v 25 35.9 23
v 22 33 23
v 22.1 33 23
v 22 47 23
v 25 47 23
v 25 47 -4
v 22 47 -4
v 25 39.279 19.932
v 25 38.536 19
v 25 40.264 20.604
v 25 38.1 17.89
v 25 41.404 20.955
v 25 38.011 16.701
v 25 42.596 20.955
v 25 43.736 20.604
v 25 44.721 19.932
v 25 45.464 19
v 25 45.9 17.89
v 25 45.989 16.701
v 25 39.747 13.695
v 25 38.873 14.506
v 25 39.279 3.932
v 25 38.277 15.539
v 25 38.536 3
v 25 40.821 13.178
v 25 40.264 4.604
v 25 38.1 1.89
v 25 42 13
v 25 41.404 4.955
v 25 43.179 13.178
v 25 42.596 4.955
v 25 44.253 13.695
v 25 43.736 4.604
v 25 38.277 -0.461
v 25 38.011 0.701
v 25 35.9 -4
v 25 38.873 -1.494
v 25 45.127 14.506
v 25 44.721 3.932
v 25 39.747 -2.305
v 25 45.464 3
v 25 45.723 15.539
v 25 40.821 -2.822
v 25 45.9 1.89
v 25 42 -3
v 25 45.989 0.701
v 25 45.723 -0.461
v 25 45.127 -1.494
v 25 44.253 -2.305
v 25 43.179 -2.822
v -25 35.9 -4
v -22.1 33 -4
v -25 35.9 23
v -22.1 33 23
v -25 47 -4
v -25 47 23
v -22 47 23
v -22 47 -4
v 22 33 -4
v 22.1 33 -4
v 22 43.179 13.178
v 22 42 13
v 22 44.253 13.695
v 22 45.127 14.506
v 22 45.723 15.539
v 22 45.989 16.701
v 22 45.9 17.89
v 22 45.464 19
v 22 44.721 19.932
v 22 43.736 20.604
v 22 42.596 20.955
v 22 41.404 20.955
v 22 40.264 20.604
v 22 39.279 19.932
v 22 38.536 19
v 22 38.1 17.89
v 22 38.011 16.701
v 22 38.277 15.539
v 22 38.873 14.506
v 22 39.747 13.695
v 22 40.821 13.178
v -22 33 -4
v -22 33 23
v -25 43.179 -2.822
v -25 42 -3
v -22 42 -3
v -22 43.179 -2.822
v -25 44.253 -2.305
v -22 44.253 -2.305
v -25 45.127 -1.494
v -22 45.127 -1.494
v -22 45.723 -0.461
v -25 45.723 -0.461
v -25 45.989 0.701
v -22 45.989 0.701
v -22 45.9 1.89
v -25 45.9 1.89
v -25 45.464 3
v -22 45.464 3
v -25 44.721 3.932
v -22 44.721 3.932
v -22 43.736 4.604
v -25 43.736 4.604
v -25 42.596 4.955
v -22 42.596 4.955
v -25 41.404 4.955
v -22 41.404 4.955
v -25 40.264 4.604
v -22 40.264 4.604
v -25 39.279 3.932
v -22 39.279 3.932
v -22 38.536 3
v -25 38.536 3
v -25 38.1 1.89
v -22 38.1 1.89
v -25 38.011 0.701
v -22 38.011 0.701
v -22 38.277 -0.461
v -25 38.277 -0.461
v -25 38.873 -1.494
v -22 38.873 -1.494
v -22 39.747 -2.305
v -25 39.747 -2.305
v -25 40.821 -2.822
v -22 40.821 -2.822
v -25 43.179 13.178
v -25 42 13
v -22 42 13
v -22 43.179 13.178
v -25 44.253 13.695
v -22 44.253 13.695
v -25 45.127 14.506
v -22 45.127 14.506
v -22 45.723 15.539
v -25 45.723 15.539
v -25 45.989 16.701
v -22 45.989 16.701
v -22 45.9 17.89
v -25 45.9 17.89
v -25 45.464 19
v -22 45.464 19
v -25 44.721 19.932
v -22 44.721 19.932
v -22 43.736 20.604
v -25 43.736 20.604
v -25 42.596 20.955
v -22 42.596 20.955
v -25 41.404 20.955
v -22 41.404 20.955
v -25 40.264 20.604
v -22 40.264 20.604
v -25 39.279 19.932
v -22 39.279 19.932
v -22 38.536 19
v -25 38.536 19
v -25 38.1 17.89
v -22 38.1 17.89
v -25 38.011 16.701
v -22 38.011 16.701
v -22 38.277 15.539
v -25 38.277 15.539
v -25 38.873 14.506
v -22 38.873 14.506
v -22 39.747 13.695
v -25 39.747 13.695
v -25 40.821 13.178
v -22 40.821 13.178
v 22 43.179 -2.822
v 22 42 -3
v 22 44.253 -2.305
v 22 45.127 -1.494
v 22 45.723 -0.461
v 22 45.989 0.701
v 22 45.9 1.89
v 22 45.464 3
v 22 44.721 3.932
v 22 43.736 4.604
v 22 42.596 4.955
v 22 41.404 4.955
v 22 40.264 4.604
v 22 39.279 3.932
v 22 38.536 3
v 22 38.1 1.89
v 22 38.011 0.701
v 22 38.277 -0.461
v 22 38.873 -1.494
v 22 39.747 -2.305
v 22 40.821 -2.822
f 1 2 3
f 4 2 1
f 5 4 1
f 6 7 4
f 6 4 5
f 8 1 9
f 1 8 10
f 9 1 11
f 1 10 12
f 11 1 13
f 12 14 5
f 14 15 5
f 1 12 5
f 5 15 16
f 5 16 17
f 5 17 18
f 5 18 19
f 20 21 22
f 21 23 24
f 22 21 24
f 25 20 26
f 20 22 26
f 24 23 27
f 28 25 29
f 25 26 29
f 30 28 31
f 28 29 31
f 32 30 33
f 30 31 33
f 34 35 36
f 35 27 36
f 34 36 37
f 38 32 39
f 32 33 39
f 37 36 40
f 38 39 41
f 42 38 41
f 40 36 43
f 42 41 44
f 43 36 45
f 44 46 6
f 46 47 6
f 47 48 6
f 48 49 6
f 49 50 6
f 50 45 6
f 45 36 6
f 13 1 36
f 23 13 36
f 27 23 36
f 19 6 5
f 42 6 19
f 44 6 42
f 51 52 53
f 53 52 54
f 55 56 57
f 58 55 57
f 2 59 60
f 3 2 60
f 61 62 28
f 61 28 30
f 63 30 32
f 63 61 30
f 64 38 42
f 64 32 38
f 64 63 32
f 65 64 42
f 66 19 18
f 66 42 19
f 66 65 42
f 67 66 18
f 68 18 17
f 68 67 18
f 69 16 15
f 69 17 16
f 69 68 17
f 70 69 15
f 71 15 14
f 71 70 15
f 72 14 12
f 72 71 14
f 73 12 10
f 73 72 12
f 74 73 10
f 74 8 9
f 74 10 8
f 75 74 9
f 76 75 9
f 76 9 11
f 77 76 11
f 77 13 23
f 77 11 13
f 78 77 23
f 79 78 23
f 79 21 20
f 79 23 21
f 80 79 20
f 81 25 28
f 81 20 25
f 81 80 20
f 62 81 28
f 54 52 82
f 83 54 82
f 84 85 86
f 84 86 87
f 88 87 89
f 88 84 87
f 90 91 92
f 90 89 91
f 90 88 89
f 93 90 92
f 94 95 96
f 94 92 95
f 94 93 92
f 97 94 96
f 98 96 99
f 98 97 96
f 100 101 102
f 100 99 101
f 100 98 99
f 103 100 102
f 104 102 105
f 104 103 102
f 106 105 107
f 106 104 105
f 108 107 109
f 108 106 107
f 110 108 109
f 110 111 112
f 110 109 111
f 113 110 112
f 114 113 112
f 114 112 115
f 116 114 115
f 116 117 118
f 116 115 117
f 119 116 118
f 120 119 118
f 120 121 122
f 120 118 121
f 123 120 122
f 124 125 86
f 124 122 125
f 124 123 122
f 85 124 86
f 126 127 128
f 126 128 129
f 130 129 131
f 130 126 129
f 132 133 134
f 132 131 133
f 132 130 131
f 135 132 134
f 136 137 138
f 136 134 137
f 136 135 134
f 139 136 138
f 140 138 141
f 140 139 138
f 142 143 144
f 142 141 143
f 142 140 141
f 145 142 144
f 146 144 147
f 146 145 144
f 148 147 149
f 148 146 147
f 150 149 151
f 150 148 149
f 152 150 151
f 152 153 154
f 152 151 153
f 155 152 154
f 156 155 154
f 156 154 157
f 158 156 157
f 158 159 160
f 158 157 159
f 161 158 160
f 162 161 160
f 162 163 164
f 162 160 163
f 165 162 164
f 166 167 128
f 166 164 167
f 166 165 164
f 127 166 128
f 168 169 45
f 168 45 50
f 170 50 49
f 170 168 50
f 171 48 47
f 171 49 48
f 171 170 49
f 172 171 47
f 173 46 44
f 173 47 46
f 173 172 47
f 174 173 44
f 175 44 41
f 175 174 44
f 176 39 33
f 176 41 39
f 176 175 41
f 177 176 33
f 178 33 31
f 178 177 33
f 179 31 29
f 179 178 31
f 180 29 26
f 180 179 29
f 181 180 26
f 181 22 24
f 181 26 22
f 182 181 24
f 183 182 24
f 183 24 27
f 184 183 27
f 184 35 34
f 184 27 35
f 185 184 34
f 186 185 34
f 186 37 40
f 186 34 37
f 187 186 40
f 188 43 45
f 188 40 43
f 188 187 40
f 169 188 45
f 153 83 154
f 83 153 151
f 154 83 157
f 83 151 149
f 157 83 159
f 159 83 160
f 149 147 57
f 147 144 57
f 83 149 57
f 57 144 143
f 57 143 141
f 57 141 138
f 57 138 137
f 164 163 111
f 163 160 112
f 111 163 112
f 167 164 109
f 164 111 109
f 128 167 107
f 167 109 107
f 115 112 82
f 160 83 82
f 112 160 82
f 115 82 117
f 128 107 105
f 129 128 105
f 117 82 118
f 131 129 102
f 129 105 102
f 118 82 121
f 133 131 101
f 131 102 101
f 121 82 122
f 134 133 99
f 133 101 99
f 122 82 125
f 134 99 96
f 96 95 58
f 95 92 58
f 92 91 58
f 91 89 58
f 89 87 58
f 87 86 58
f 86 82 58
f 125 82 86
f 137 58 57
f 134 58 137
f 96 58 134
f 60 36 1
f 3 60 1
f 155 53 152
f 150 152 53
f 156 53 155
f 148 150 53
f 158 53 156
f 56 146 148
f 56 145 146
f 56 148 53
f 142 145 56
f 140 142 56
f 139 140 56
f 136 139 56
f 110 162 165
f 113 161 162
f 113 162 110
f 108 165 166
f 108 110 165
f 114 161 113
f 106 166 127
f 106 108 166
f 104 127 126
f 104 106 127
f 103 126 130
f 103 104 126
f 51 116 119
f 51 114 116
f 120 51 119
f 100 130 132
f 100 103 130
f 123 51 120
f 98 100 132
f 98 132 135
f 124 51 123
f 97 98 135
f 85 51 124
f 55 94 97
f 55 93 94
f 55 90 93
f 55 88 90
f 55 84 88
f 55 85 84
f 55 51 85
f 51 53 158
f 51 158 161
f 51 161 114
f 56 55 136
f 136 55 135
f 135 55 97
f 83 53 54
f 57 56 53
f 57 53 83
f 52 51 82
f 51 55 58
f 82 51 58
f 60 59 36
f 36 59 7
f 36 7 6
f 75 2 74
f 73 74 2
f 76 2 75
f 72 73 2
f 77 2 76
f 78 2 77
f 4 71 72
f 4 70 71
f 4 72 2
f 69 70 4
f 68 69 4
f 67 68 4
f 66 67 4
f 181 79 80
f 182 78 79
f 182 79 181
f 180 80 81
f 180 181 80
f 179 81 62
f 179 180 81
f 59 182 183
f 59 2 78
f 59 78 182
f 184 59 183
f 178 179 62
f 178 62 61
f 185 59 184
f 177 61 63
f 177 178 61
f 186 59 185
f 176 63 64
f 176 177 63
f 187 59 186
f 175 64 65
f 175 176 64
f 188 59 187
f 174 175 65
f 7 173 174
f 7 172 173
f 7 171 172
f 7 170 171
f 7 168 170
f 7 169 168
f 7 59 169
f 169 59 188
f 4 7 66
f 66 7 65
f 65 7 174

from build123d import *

# Parameters (mm, degrees)
CYLINDER1823_R     = 4
CYLINDER1823_DEPTH = 16
CYLINDER1820_R     = 4
CYLINDER1820_DEPTH = 16
CYLINDER1822_R     = 4
CYLINDER1822_DEPTH = 16
CYLINDER1821_R     = 4
CYLINDER1821_DEPTH = 16
BOX719_W           = 44
BOX719_H           = 27
BOX719_DEPTH       = 28
BOX720_W           = 50
BOX720_H           = 14
BOX720_DEPTH       = 27
CHAMFER071_SIZE    = 2.9
CHAMFER072_SIZE    = 2.9


with BuildPart() as v_lec1823:
    # Cylinder1823 → Cylinder1823 (new body)
    with BuildSketch(Plane(origin=(18, 42, 17), x_dir=(0, 0, -1), z_dir=(1, 0, 0))):
        Circle(CYLINDER1823_R)
    extrude(amount=CYLINDER1823_DEPTH)


with BuildPart() as v_lec1820:
    # Cylinder1820 → Cylinder1820 (new body)
    with BuildSketch(Plane(origin=(18, 42, 1), x_dir=(0, 0, -1), z_dir=(1, 0, 0))):
        Circle(CYLINDER1820_R)
    extrude(amount=CYLINDER1820_DEPTH)


with BuildPart() as v_lec1822:
    # Cylinder1822 → Cylinder1822 (new body)
    with BuildSketch(Plane(origin=(-34, 42, 17), x_dir=(0, 0, -1), z_dir=(1, 0, 0))):
        Circle(CYLINDER1822_R)
    extrude(amount=CYLINDER1822_DEPTH)


with BuildPart() as compound899:
    # Cylinder1821 → Cylinder1821 (new body)
    with BuildSketch(Plane(origin=(-34, 42, 1), x_dir=(0, 0, -1), z_dir=(1, 0, 0))):
        Circle(CYLINDER1821_R)
    extrude(amount=CYLINDER1821_DEPTH)

    # Compound899: union Válec1823, Válec1820, Válec1822
    add(v_lec1823.part)
    add(v_lec1820.part)
    add(v_lec1822.part)


with BuildPart() as krychle719:
    # Box719 → Box719 (new body)
    with BuildSketch(Plane(origin=(-22, 20, -4), x_dir=(1, 0, 0), z_dir=(0, 0, 1))):
        with Locations((22, 13.5)):
            Rectangle(BOX719_W, BOX719_H)
    extrude(amount=BOX719_DEPTH)


with BuildPart() as chamfer072:
    # Box720 → Box720 (new body)
    with BuildSketch(Plane(origin=(-25, 33, -4), x_dir=(1, 0, 0), z_dir=(0, 0, 1))):
        with Locations((25, 7)):
            Rectangle(BOX720_W, BOX720_H)
    extrude(amount=BOX720_DEPTH)

    # Cut533: cut Krychle719
    add(krychle719.part, mode=Mode.SUBTRACT)

    # Cut534: cut Compound899
    add(compound899.part, mode=Mode.SUBTRACT)

    # Chamfer071
    chamfer071_edges = [chamfer072.edges().sort_by_distance(p)[0] for p in [
        (25, 33, 9.5),
    ]]
    chamfer(chamfer071_edges, length=CHAMFER071_SIZE)

    # Chamfer072
    chamfer072_edges = [chamfer072.edges().sort_by_distance(p)[0] for p in [
        (-25, 33, 9.5),
    ]]
    chamfer(chamfer072_edges, length=CHAMFER072_SIZE)


solid = chamfer072.part
